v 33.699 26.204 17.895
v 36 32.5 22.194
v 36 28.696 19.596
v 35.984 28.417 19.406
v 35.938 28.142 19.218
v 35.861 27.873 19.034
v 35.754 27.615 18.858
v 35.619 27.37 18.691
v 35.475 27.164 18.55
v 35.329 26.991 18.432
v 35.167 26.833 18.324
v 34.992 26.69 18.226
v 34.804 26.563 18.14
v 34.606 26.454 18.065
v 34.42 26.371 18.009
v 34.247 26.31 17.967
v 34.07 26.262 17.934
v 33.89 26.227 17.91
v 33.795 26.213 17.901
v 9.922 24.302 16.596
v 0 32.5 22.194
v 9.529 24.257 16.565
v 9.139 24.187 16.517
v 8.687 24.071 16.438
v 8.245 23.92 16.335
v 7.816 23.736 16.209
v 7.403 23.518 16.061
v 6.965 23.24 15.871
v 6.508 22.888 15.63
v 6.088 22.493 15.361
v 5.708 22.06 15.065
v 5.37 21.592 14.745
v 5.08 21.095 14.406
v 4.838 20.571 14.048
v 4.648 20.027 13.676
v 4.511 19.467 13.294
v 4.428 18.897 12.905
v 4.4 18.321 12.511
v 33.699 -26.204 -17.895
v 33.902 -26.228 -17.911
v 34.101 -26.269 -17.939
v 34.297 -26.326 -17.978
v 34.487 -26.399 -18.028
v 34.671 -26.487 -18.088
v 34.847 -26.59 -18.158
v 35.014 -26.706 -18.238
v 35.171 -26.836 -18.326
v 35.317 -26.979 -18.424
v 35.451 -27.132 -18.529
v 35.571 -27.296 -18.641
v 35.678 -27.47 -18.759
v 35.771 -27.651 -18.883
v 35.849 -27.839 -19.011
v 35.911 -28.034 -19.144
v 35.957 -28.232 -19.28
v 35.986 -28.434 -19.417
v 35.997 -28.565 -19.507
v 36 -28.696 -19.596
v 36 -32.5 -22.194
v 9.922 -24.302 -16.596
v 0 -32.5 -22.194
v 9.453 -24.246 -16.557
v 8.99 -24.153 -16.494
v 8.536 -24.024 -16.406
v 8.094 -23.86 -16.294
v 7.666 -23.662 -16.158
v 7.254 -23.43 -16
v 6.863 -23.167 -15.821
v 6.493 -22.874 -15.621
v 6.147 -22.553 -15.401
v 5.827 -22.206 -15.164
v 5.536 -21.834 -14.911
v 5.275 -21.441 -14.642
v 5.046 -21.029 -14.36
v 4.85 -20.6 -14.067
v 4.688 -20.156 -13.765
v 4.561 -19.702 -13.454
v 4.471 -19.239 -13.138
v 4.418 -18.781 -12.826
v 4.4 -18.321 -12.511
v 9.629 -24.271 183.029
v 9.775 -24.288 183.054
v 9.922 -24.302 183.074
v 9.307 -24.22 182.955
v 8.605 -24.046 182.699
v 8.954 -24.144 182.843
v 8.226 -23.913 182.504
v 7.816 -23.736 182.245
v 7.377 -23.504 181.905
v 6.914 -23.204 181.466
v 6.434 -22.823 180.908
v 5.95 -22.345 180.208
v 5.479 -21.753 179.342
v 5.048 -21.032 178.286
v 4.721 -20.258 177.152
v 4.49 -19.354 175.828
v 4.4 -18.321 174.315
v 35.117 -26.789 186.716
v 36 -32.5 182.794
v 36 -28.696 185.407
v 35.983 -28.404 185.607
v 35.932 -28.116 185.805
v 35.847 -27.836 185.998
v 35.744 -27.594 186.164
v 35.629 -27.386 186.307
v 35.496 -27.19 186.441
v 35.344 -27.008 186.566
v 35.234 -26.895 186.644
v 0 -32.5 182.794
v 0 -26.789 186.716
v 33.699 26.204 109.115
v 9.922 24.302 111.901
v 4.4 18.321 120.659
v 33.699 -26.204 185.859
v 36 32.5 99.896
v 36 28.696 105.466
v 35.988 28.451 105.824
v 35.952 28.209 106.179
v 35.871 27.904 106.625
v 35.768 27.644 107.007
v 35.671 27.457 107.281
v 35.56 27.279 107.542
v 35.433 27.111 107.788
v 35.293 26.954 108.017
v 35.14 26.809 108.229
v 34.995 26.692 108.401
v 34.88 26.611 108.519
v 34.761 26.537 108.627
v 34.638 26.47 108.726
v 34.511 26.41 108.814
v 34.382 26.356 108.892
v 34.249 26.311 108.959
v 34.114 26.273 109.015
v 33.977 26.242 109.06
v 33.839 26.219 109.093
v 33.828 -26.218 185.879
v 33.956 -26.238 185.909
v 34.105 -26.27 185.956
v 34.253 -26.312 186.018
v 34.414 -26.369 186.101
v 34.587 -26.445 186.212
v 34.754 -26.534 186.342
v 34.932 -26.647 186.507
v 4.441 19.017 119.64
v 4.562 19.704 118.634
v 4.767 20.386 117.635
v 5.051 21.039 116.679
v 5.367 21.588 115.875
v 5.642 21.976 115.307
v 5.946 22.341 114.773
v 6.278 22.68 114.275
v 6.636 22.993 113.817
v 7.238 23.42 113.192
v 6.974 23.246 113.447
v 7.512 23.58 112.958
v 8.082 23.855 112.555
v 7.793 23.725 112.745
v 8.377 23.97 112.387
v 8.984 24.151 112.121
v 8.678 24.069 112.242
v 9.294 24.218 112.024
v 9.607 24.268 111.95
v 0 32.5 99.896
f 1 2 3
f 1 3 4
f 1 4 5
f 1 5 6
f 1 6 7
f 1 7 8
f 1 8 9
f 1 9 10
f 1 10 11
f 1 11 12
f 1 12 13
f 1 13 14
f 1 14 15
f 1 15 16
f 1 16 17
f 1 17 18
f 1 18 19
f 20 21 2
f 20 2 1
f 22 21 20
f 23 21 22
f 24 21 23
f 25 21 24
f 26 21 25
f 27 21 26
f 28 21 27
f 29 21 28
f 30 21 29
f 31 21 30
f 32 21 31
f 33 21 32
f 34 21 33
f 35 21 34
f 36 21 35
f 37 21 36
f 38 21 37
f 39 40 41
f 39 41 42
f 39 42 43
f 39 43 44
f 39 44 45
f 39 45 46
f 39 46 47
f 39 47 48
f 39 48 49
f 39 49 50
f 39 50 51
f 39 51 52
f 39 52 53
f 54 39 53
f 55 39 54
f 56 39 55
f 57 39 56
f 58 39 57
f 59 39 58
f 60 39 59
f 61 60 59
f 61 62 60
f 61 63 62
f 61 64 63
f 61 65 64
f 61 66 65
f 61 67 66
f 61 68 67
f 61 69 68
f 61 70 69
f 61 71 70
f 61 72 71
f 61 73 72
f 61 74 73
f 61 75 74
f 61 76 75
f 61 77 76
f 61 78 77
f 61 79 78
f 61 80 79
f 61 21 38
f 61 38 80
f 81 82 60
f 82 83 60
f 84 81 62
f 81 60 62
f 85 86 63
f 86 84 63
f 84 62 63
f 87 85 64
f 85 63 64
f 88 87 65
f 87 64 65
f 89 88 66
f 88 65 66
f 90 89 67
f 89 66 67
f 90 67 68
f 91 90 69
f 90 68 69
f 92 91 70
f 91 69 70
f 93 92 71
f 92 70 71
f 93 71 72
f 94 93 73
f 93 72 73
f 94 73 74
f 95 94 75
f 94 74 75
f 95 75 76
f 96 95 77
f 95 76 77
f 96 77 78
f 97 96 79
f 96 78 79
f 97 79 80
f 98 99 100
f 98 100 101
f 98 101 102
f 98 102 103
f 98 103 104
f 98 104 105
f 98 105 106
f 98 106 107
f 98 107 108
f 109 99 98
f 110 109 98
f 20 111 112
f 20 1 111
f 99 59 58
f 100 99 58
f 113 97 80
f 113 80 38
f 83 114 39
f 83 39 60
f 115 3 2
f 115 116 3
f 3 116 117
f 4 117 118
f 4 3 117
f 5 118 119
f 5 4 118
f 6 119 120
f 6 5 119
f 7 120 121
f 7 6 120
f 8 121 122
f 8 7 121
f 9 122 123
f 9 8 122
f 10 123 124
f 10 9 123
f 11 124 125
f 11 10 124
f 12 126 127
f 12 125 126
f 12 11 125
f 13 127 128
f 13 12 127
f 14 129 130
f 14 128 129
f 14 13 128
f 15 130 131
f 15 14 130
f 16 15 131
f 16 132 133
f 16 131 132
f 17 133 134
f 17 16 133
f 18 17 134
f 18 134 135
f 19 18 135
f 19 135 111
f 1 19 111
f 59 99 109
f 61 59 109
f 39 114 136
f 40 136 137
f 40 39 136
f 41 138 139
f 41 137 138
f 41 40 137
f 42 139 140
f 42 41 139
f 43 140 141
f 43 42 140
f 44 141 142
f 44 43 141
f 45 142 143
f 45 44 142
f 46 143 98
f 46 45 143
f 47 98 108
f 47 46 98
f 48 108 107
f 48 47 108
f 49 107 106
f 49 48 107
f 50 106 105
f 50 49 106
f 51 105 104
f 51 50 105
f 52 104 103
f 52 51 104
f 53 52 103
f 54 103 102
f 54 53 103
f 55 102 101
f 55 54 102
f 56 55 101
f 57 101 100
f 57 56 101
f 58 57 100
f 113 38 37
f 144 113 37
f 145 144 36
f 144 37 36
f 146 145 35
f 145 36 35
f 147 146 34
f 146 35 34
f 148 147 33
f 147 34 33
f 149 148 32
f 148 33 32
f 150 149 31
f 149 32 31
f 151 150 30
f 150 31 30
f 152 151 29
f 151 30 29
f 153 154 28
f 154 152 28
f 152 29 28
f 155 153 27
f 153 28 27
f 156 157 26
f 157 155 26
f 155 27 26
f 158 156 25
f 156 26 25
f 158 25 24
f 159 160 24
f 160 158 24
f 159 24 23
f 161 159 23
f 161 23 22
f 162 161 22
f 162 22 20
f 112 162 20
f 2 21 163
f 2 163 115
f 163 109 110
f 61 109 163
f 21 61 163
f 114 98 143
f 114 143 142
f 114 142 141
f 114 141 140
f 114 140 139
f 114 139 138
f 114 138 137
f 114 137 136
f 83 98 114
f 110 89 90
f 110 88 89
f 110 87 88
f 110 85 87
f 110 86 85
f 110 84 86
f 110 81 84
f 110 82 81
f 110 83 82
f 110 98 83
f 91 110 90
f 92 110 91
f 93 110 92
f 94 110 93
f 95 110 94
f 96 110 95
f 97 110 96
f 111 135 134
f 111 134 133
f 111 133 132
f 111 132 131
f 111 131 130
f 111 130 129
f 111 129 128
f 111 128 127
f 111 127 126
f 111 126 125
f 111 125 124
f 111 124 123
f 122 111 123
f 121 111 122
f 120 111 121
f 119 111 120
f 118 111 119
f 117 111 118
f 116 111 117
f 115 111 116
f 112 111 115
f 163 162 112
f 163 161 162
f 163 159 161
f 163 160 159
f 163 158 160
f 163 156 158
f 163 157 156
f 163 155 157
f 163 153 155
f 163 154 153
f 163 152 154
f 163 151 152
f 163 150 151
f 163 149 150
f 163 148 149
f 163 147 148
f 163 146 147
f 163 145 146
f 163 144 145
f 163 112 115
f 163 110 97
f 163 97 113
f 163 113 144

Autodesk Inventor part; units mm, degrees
ref_plane "Начальная плоскость" through (0, 0, -22.1942) normal (0, 0, 1) x (1, 0, 0)
ref_plane "Конечная плоскость" through (0, 0, 186.7165) normal (0, 0, 1) x (1, 0, 0)
sketch "Эскиз" plane through (0, 0, 0) normal (0, 0, 1) x (1, 0, 0)
  line L0 (36, -32.5) -> (0, -32.5)
  line L1 (36, -32.5) -> (36, -28.696)
  line L2 (33.6994, -26.2039) -> (9.9215, -24.3017)
  line L3 (4.4, -18.3208) -> (4.4, 18.3208)
  line L4 (33.6994, 26.2039) -> (9.9215, 24.3017)
  line L5 (36, 28.696) -> (36, 32.5)
  line L6 (0, 32.5) -> (36, 32.5)
  line L7 (0, -32.5) -> (0, 32.5)
  arc A0 (4.4, -18.3208) -> (9.9215, -24.3017) centre (10.4, -18.3208) ccw
  arc A1 (9.9215, 24.3017) -> (4.4, 18.3208) centre (10.4, 18.3208) ccw
  arc A2 (36, -28.696) -> (33.6994, -26.2039) centre (33.5, -28.696) ccw
  arc A3 (33.6994, 26.2039) -> (36, 28.696) centre (33.5, 28.696) ccw
  line L8 (0, 45.5) -> (0, -45.5) construction
  line L9 (-7.2974, 0) -> (43.7847, 0) construction
  point P0 (36, -26.388)
  point P1 (4.4, -23.86)
  point P2 (4.4, 23.86)
  point P3 (36, 26.388)
  dimension "d3" = 36
  dimension "d5" = 4.4
  dimension "d7" = 65
  dimension "d9" = 8.64
  dimension "d11" = 8.64
  dimension "d13" = 6.112
  dimension "d15" = 6.112
  dimension "d22" = 6
  dimension "d23" = 2.5
  dimension "d24" = 32.5
  dimension "d25" = 0
extrude "Тело" add sketch "Эскиз" along normal up to surface (208.9107 mm away) from surface at -22.1942
sketch "Sketch3" plane through (0, 0, 0) normal (0, 0, 1) x (1, 0, 0)
  line L0 (0, 0) -> (10, 0)
ref_plane "Work Plane7" through (0, 0, 0) normal (0, -1, 0) x (1, 0, 0)
sketch "Sketch4" plane through (0, 0, 0) normal (0, -1, 0) x (1, 0, 0)
  line L0 (-2, -22.1942) -> (12, -22.1942)
  line L1 (-2, 186.7165) -> (12, 186.7165)
  dimension "d29" = 208.9107
ref_plane "РабПлоскость8" through (-29, 0, 205.1172) normal (0, -0.5661745, 0.8242854) x (1, 0, 0)
split "Разделение1" plane through (-29, 0, 205.1172) removes the side toward (0, -0.5661745, 0.8242854)
ref_plane "РабПлоскость9" through (36, 328.8626, 224.5798) normal (0, 0.5639457, -0.8258119) x (1, 0, 0)
split "Разделение2" plane through (36, 328.8626, 224.5798) removes the side toward (0, 0.5639457, -0.8258119)
ref_plane "РабПлоскость10" through (36, 68.6864, 46.906) normal (0, 0.8258135, 0.5639433) x (1, 0, 0)
split "Разделение3" plane through (36, 68.6864, 46.906) removes the side toward (0, 0.8258135, 0.5639433)
equation "\"d3\" = b"
equation "\"d5\" = t1"
equation "\"d7\" = ParH"
equation "\"d9\" = msp_x1 + t2"
equation "\"d11\" = msp_x1 + t2"
equation "\"d13\" = -msp_x2 + t2"
equation "\"d15\" = -msp_x2 + t2"
equation "\"d22\" = R"
equation "\"d23\" = R1"
equation "\"d24\" = 0.5 * d7"
equation "\"d16\" = G_L"
equation "\"R1\" = 2.5"
equation "\"R\" = 6"
equation "\"t1\" = 4.4"
equation "\"t2\" = 7.2"
equation "\"ParH\" = 65"
equation "\"b\" = 36"
equation "\"msp_x1\" = 0.04 * b"
equation "\"msp_x2\" = -0.08 * t1 + 0.04 * b"
equation "\"G_L\" = d29"
equation "\"ex\" = 0"
equation "\"G_OFFSET_START\" = 22.1942"
equation "\"G_OFFSET_END\" = -18.40074"
equation "\"d26\" = -G_OFFSET_START"
equation "\"d27\" = G_OFFSET_END + B_L"
equation "\"B_L\" = 205.11724"
properties part number "Швеллер 6.5U-208,91 ГОСТ 8240-97" material "Сталь, мягкая"
